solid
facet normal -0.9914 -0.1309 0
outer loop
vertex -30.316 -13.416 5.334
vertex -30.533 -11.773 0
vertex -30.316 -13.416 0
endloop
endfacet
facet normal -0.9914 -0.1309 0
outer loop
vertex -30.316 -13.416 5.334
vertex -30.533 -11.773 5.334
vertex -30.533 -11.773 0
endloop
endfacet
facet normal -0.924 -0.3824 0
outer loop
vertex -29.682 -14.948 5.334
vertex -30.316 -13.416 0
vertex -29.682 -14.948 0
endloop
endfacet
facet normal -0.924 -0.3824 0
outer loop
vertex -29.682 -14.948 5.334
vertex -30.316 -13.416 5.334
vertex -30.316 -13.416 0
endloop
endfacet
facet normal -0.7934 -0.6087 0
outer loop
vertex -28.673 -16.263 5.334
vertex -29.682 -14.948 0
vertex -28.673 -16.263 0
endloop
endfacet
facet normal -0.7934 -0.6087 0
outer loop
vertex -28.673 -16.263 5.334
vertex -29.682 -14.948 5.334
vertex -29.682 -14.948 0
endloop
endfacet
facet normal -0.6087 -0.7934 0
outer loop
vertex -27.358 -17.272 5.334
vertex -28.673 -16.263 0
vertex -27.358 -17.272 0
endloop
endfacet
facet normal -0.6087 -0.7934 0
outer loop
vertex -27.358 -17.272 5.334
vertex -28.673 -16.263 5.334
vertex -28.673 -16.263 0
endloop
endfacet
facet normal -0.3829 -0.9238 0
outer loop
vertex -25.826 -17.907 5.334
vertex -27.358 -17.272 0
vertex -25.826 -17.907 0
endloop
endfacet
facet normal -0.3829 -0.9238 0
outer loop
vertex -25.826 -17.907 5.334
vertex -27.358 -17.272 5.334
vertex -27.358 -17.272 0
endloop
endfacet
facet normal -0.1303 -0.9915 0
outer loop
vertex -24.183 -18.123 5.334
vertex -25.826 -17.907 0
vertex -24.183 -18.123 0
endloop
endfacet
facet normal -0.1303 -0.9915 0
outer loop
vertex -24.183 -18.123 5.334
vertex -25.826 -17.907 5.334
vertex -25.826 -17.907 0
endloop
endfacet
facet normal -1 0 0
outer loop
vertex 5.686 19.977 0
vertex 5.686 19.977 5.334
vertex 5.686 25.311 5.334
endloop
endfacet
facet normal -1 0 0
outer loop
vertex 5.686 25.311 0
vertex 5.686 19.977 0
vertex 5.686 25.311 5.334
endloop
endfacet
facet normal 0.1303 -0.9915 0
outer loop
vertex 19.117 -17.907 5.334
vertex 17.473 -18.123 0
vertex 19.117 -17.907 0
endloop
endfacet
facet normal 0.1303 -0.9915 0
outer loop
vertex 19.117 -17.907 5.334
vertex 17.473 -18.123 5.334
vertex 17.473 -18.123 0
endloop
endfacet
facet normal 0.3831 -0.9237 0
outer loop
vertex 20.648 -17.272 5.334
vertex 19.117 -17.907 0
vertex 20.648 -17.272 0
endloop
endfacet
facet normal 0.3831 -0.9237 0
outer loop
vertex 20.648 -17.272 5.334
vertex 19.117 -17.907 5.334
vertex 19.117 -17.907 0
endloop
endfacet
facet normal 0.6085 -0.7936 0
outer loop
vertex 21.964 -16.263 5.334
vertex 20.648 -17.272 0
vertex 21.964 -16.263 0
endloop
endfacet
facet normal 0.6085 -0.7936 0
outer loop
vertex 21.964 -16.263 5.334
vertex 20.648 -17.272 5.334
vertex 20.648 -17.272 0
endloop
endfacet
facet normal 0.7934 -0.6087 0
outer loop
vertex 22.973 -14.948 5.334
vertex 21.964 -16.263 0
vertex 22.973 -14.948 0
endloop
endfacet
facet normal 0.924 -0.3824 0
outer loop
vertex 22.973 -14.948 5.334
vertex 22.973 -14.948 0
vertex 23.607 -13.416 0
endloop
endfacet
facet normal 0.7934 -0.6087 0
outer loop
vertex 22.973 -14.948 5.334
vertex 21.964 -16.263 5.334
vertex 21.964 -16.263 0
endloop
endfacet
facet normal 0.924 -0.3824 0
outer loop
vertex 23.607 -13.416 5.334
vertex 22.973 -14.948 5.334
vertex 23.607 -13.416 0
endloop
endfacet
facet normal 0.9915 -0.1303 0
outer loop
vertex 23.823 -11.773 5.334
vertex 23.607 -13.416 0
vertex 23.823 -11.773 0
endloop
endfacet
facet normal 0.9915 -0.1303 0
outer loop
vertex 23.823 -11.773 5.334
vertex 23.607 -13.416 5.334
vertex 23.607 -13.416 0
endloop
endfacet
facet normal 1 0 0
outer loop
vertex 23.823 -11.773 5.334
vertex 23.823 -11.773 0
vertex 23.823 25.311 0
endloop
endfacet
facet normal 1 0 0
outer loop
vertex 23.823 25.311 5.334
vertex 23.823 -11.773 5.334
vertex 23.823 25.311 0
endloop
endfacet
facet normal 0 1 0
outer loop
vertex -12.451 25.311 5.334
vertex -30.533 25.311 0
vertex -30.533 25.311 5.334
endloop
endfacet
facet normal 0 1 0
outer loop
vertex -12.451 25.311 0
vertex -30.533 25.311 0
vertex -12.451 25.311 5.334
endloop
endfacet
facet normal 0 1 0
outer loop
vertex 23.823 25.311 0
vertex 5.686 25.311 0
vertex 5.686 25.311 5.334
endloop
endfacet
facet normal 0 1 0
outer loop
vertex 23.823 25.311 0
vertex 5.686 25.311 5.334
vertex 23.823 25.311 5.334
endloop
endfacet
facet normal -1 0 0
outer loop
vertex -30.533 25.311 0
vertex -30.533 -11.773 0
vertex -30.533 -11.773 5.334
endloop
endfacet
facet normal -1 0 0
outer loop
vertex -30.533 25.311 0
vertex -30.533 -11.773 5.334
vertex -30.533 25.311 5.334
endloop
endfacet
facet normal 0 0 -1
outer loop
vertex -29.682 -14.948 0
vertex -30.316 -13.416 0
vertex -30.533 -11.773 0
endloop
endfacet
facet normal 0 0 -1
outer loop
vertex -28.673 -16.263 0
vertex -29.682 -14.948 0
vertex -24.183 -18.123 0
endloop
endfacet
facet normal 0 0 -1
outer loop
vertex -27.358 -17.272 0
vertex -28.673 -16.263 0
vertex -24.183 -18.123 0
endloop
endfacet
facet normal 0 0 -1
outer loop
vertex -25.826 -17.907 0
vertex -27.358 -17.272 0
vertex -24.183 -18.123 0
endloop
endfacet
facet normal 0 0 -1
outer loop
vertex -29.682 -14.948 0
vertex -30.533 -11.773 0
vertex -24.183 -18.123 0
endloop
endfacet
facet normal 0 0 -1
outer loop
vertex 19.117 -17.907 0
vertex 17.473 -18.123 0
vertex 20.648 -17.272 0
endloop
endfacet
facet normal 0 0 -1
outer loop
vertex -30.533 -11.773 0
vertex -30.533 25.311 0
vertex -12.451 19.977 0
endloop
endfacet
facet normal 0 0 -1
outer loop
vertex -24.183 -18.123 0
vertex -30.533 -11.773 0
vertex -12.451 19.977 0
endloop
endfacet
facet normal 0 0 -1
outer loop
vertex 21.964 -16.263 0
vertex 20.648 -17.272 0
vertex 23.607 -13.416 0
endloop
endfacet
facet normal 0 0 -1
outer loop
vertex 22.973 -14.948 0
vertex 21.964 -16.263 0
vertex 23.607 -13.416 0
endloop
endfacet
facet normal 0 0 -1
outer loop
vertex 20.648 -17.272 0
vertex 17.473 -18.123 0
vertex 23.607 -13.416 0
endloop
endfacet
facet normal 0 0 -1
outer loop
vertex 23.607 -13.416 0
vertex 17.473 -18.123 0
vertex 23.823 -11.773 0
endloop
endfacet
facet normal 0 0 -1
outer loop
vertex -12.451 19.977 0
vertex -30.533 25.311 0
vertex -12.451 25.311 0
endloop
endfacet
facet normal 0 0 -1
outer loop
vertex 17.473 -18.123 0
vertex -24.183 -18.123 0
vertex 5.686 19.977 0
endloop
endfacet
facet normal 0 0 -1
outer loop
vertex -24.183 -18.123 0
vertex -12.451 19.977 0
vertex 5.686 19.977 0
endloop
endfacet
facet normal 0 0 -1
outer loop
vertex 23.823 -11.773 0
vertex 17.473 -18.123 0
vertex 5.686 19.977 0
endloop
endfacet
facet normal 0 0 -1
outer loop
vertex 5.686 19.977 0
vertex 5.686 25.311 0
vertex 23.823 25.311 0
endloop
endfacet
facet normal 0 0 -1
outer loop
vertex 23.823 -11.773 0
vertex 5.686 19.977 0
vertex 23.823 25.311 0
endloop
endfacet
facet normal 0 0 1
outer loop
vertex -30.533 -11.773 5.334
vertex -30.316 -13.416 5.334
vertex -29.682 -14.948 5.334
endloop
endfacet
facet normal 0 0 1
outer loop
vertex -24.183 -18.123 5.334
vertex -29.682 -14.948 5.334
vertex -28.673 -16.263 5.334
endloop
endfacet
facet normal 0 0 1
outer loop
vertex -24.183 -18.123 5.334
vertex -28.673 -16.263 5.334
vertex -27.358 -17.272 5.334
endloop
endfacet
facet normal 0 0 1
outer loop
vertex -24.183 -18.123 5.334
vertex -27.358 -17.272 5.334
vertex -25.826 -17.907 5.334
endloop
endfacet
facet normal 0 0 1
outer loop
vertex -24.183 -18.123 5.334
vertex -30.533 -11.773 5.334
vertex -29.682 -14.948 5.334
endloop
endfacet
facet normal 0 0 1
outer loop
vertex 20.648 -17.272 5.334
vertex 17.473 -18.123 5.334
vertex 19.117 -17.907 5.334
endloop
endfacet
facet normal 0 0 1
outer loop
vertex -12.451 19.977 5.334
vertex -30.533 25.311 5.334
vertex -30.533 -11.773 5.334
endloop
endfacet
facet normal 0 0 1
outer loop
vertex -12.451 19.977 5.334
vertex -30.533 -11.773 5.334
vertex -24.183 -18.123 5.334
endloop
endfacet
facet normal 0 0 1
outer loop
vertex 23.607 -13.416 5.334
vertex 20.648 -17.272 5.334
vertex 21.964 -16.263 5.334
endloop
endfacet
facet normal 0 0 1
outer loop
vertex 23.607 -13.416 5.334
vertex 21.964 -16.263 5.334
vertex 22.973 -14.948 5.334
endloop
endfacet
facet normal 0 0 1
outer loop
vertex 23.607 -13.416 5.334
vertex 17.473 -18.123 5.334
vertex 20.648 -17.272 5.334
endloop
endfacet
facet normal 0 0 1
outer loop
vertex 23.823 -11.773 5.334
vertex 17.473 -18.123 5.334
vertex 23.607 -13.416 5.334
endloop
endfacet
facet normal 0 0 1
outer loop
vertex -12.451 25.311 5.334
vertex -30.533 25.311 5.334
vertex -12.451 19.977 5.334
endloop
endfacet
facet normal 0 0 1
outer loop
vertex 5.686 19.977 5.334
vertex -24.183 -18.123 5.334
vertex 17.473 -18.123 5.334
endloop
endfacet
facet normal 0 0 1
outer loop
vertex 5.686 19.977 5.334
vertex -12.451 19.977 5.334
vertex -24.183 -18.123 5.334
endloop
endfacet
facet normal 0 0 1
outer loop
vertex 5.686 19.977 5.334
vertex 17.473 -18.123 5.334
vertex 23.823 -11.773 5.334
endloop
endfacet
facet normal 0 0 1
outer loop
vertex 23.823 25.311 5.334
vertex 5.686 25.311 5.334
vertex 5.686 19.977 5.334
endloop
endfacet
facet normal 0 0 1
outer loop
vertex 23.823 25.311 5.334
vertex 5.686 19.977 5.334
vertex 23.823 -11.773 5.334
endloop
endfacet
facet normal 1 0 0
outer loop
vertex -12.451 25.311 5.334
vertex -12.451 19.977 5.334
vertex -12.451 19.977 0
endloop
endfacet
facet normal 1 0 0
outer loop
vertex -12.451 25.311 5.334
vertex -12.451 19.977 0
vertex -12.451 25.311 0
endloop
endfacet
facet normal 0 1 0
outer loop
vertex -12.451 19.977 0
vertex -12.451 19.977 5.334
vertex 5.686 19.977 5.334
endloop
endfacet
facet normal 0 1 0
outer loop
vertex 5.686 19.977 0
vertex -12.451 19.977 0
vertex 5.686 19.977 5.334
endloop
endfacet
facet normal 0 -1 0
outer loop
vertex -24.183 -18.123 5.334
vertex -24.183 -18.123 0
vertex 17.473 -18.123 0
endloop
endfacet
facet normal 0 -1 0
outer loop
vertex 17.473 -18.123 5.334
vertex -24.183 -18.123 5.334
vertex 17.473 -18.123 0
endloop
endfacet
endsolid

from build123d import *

# Parameters (mm, degrees)
SKETCH1_W           = 54.356
SKETCH1_H           = 43.434
BOSS_EXTRUDE1_DEPTH = 5.334
SKETCH2_W           = 18.137033298
SKETCH2_H           = 5.334
CUT_EXTRUDE1_DEPTH  = 41.016719041
FILLET1_R           = 6.35


with BuildPart() as part:
    # Sketch1 → Boss-Extrude1 (new body)
    with BuildSketch(Plane.XY):
        with Locations((-3.35450847, 3.594107707)):
            Rectangle(SKETCH1_W, SKETCH1_H)
    extrude(amount=BOSS_EXTRUDE1_DEPTH)

    # Sketch2 → Cut-Extrude1 (cut, through all)
    with BuildSketch(Plane.XY.offset(5.334)):
        with Locations((-3.382058417, 22.644107707)):
            Rectangle(SKETCH2_W, SKETCH2_H)
    extrude(amount=-CUT_EXTRUDE1_DEPTH, mode=Mode.SUBTRACT)

    # Fillet1
    fillet1_edges = [part.edges().sort_by_distance(p)[0] for p in [
        (23.82349153, -18.122892293, 2.667),
        (-30.53250847, -18.122892293, 2.667),
    ]]
    fillet(fillet1_edges, radius=FILLET1_R)


solid = part.part
